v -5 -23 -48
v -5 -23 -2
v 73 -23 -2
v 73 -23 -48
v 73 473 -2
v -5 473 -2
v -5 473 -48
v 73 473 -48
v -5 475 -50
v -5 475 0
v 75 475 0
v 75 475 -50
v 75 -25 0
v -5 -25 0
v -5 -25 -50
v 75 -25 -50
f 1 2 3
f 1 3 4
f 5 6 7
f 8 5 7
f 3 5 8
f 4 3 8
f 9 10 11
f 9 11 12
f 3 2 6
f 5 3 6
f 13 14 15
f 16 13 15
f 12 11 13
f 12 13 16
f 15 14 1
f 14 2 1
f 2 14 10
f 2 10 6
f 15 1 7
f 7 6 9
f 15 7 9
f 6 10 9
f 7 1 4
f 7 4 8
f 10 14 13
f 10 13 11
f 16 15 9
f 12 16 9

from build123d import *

# Parameters (mm, degrees)
SKETCH_2_W        = 50
SKETCH_2_H        = 500
SKETCH_2_W_2      = 46
SKETCH_2_H_2      = 496
EXTRUDE_1_DEPTH   = 80
SKETCH_3_W        = 50
SKETCH_3_H        = 500
EXTRUDE_1_2_DEPTH = 2


with BuildPart() as part:
    # 草图2 → Extrude 1 (new body)
    with BuildSketch(Plane(origin=(-5, 0, 0), x_dir=(0, 0, -1), z_dir=(1, 0, 0))):
        with Locations((25, 225)):
            Rectangle(SKETCH_2_W, SKETCH_2_H)
        with Locations((25, 225)):
            Rectangle(SKETCH_2_W_2, SKETCH_2_H_2, mode=Mode.SUBTRACT)
    extrude(amount=EXTRUDE_1_DEPTH)

    # 草图3 → Extrude 1 2 (add)
    with BuildSketch(Plane(origin=(75, 0, 0), x_dir=(0, 0, -1), z_dir=(1, 0, 0))):
        with Locations((25, 225)):
            Rectangle(SKETCH_3_W, SKETCH_3_H)
    extrude(amount=-EXTRUDE_1_2_DEPTH)


solid = part.part
